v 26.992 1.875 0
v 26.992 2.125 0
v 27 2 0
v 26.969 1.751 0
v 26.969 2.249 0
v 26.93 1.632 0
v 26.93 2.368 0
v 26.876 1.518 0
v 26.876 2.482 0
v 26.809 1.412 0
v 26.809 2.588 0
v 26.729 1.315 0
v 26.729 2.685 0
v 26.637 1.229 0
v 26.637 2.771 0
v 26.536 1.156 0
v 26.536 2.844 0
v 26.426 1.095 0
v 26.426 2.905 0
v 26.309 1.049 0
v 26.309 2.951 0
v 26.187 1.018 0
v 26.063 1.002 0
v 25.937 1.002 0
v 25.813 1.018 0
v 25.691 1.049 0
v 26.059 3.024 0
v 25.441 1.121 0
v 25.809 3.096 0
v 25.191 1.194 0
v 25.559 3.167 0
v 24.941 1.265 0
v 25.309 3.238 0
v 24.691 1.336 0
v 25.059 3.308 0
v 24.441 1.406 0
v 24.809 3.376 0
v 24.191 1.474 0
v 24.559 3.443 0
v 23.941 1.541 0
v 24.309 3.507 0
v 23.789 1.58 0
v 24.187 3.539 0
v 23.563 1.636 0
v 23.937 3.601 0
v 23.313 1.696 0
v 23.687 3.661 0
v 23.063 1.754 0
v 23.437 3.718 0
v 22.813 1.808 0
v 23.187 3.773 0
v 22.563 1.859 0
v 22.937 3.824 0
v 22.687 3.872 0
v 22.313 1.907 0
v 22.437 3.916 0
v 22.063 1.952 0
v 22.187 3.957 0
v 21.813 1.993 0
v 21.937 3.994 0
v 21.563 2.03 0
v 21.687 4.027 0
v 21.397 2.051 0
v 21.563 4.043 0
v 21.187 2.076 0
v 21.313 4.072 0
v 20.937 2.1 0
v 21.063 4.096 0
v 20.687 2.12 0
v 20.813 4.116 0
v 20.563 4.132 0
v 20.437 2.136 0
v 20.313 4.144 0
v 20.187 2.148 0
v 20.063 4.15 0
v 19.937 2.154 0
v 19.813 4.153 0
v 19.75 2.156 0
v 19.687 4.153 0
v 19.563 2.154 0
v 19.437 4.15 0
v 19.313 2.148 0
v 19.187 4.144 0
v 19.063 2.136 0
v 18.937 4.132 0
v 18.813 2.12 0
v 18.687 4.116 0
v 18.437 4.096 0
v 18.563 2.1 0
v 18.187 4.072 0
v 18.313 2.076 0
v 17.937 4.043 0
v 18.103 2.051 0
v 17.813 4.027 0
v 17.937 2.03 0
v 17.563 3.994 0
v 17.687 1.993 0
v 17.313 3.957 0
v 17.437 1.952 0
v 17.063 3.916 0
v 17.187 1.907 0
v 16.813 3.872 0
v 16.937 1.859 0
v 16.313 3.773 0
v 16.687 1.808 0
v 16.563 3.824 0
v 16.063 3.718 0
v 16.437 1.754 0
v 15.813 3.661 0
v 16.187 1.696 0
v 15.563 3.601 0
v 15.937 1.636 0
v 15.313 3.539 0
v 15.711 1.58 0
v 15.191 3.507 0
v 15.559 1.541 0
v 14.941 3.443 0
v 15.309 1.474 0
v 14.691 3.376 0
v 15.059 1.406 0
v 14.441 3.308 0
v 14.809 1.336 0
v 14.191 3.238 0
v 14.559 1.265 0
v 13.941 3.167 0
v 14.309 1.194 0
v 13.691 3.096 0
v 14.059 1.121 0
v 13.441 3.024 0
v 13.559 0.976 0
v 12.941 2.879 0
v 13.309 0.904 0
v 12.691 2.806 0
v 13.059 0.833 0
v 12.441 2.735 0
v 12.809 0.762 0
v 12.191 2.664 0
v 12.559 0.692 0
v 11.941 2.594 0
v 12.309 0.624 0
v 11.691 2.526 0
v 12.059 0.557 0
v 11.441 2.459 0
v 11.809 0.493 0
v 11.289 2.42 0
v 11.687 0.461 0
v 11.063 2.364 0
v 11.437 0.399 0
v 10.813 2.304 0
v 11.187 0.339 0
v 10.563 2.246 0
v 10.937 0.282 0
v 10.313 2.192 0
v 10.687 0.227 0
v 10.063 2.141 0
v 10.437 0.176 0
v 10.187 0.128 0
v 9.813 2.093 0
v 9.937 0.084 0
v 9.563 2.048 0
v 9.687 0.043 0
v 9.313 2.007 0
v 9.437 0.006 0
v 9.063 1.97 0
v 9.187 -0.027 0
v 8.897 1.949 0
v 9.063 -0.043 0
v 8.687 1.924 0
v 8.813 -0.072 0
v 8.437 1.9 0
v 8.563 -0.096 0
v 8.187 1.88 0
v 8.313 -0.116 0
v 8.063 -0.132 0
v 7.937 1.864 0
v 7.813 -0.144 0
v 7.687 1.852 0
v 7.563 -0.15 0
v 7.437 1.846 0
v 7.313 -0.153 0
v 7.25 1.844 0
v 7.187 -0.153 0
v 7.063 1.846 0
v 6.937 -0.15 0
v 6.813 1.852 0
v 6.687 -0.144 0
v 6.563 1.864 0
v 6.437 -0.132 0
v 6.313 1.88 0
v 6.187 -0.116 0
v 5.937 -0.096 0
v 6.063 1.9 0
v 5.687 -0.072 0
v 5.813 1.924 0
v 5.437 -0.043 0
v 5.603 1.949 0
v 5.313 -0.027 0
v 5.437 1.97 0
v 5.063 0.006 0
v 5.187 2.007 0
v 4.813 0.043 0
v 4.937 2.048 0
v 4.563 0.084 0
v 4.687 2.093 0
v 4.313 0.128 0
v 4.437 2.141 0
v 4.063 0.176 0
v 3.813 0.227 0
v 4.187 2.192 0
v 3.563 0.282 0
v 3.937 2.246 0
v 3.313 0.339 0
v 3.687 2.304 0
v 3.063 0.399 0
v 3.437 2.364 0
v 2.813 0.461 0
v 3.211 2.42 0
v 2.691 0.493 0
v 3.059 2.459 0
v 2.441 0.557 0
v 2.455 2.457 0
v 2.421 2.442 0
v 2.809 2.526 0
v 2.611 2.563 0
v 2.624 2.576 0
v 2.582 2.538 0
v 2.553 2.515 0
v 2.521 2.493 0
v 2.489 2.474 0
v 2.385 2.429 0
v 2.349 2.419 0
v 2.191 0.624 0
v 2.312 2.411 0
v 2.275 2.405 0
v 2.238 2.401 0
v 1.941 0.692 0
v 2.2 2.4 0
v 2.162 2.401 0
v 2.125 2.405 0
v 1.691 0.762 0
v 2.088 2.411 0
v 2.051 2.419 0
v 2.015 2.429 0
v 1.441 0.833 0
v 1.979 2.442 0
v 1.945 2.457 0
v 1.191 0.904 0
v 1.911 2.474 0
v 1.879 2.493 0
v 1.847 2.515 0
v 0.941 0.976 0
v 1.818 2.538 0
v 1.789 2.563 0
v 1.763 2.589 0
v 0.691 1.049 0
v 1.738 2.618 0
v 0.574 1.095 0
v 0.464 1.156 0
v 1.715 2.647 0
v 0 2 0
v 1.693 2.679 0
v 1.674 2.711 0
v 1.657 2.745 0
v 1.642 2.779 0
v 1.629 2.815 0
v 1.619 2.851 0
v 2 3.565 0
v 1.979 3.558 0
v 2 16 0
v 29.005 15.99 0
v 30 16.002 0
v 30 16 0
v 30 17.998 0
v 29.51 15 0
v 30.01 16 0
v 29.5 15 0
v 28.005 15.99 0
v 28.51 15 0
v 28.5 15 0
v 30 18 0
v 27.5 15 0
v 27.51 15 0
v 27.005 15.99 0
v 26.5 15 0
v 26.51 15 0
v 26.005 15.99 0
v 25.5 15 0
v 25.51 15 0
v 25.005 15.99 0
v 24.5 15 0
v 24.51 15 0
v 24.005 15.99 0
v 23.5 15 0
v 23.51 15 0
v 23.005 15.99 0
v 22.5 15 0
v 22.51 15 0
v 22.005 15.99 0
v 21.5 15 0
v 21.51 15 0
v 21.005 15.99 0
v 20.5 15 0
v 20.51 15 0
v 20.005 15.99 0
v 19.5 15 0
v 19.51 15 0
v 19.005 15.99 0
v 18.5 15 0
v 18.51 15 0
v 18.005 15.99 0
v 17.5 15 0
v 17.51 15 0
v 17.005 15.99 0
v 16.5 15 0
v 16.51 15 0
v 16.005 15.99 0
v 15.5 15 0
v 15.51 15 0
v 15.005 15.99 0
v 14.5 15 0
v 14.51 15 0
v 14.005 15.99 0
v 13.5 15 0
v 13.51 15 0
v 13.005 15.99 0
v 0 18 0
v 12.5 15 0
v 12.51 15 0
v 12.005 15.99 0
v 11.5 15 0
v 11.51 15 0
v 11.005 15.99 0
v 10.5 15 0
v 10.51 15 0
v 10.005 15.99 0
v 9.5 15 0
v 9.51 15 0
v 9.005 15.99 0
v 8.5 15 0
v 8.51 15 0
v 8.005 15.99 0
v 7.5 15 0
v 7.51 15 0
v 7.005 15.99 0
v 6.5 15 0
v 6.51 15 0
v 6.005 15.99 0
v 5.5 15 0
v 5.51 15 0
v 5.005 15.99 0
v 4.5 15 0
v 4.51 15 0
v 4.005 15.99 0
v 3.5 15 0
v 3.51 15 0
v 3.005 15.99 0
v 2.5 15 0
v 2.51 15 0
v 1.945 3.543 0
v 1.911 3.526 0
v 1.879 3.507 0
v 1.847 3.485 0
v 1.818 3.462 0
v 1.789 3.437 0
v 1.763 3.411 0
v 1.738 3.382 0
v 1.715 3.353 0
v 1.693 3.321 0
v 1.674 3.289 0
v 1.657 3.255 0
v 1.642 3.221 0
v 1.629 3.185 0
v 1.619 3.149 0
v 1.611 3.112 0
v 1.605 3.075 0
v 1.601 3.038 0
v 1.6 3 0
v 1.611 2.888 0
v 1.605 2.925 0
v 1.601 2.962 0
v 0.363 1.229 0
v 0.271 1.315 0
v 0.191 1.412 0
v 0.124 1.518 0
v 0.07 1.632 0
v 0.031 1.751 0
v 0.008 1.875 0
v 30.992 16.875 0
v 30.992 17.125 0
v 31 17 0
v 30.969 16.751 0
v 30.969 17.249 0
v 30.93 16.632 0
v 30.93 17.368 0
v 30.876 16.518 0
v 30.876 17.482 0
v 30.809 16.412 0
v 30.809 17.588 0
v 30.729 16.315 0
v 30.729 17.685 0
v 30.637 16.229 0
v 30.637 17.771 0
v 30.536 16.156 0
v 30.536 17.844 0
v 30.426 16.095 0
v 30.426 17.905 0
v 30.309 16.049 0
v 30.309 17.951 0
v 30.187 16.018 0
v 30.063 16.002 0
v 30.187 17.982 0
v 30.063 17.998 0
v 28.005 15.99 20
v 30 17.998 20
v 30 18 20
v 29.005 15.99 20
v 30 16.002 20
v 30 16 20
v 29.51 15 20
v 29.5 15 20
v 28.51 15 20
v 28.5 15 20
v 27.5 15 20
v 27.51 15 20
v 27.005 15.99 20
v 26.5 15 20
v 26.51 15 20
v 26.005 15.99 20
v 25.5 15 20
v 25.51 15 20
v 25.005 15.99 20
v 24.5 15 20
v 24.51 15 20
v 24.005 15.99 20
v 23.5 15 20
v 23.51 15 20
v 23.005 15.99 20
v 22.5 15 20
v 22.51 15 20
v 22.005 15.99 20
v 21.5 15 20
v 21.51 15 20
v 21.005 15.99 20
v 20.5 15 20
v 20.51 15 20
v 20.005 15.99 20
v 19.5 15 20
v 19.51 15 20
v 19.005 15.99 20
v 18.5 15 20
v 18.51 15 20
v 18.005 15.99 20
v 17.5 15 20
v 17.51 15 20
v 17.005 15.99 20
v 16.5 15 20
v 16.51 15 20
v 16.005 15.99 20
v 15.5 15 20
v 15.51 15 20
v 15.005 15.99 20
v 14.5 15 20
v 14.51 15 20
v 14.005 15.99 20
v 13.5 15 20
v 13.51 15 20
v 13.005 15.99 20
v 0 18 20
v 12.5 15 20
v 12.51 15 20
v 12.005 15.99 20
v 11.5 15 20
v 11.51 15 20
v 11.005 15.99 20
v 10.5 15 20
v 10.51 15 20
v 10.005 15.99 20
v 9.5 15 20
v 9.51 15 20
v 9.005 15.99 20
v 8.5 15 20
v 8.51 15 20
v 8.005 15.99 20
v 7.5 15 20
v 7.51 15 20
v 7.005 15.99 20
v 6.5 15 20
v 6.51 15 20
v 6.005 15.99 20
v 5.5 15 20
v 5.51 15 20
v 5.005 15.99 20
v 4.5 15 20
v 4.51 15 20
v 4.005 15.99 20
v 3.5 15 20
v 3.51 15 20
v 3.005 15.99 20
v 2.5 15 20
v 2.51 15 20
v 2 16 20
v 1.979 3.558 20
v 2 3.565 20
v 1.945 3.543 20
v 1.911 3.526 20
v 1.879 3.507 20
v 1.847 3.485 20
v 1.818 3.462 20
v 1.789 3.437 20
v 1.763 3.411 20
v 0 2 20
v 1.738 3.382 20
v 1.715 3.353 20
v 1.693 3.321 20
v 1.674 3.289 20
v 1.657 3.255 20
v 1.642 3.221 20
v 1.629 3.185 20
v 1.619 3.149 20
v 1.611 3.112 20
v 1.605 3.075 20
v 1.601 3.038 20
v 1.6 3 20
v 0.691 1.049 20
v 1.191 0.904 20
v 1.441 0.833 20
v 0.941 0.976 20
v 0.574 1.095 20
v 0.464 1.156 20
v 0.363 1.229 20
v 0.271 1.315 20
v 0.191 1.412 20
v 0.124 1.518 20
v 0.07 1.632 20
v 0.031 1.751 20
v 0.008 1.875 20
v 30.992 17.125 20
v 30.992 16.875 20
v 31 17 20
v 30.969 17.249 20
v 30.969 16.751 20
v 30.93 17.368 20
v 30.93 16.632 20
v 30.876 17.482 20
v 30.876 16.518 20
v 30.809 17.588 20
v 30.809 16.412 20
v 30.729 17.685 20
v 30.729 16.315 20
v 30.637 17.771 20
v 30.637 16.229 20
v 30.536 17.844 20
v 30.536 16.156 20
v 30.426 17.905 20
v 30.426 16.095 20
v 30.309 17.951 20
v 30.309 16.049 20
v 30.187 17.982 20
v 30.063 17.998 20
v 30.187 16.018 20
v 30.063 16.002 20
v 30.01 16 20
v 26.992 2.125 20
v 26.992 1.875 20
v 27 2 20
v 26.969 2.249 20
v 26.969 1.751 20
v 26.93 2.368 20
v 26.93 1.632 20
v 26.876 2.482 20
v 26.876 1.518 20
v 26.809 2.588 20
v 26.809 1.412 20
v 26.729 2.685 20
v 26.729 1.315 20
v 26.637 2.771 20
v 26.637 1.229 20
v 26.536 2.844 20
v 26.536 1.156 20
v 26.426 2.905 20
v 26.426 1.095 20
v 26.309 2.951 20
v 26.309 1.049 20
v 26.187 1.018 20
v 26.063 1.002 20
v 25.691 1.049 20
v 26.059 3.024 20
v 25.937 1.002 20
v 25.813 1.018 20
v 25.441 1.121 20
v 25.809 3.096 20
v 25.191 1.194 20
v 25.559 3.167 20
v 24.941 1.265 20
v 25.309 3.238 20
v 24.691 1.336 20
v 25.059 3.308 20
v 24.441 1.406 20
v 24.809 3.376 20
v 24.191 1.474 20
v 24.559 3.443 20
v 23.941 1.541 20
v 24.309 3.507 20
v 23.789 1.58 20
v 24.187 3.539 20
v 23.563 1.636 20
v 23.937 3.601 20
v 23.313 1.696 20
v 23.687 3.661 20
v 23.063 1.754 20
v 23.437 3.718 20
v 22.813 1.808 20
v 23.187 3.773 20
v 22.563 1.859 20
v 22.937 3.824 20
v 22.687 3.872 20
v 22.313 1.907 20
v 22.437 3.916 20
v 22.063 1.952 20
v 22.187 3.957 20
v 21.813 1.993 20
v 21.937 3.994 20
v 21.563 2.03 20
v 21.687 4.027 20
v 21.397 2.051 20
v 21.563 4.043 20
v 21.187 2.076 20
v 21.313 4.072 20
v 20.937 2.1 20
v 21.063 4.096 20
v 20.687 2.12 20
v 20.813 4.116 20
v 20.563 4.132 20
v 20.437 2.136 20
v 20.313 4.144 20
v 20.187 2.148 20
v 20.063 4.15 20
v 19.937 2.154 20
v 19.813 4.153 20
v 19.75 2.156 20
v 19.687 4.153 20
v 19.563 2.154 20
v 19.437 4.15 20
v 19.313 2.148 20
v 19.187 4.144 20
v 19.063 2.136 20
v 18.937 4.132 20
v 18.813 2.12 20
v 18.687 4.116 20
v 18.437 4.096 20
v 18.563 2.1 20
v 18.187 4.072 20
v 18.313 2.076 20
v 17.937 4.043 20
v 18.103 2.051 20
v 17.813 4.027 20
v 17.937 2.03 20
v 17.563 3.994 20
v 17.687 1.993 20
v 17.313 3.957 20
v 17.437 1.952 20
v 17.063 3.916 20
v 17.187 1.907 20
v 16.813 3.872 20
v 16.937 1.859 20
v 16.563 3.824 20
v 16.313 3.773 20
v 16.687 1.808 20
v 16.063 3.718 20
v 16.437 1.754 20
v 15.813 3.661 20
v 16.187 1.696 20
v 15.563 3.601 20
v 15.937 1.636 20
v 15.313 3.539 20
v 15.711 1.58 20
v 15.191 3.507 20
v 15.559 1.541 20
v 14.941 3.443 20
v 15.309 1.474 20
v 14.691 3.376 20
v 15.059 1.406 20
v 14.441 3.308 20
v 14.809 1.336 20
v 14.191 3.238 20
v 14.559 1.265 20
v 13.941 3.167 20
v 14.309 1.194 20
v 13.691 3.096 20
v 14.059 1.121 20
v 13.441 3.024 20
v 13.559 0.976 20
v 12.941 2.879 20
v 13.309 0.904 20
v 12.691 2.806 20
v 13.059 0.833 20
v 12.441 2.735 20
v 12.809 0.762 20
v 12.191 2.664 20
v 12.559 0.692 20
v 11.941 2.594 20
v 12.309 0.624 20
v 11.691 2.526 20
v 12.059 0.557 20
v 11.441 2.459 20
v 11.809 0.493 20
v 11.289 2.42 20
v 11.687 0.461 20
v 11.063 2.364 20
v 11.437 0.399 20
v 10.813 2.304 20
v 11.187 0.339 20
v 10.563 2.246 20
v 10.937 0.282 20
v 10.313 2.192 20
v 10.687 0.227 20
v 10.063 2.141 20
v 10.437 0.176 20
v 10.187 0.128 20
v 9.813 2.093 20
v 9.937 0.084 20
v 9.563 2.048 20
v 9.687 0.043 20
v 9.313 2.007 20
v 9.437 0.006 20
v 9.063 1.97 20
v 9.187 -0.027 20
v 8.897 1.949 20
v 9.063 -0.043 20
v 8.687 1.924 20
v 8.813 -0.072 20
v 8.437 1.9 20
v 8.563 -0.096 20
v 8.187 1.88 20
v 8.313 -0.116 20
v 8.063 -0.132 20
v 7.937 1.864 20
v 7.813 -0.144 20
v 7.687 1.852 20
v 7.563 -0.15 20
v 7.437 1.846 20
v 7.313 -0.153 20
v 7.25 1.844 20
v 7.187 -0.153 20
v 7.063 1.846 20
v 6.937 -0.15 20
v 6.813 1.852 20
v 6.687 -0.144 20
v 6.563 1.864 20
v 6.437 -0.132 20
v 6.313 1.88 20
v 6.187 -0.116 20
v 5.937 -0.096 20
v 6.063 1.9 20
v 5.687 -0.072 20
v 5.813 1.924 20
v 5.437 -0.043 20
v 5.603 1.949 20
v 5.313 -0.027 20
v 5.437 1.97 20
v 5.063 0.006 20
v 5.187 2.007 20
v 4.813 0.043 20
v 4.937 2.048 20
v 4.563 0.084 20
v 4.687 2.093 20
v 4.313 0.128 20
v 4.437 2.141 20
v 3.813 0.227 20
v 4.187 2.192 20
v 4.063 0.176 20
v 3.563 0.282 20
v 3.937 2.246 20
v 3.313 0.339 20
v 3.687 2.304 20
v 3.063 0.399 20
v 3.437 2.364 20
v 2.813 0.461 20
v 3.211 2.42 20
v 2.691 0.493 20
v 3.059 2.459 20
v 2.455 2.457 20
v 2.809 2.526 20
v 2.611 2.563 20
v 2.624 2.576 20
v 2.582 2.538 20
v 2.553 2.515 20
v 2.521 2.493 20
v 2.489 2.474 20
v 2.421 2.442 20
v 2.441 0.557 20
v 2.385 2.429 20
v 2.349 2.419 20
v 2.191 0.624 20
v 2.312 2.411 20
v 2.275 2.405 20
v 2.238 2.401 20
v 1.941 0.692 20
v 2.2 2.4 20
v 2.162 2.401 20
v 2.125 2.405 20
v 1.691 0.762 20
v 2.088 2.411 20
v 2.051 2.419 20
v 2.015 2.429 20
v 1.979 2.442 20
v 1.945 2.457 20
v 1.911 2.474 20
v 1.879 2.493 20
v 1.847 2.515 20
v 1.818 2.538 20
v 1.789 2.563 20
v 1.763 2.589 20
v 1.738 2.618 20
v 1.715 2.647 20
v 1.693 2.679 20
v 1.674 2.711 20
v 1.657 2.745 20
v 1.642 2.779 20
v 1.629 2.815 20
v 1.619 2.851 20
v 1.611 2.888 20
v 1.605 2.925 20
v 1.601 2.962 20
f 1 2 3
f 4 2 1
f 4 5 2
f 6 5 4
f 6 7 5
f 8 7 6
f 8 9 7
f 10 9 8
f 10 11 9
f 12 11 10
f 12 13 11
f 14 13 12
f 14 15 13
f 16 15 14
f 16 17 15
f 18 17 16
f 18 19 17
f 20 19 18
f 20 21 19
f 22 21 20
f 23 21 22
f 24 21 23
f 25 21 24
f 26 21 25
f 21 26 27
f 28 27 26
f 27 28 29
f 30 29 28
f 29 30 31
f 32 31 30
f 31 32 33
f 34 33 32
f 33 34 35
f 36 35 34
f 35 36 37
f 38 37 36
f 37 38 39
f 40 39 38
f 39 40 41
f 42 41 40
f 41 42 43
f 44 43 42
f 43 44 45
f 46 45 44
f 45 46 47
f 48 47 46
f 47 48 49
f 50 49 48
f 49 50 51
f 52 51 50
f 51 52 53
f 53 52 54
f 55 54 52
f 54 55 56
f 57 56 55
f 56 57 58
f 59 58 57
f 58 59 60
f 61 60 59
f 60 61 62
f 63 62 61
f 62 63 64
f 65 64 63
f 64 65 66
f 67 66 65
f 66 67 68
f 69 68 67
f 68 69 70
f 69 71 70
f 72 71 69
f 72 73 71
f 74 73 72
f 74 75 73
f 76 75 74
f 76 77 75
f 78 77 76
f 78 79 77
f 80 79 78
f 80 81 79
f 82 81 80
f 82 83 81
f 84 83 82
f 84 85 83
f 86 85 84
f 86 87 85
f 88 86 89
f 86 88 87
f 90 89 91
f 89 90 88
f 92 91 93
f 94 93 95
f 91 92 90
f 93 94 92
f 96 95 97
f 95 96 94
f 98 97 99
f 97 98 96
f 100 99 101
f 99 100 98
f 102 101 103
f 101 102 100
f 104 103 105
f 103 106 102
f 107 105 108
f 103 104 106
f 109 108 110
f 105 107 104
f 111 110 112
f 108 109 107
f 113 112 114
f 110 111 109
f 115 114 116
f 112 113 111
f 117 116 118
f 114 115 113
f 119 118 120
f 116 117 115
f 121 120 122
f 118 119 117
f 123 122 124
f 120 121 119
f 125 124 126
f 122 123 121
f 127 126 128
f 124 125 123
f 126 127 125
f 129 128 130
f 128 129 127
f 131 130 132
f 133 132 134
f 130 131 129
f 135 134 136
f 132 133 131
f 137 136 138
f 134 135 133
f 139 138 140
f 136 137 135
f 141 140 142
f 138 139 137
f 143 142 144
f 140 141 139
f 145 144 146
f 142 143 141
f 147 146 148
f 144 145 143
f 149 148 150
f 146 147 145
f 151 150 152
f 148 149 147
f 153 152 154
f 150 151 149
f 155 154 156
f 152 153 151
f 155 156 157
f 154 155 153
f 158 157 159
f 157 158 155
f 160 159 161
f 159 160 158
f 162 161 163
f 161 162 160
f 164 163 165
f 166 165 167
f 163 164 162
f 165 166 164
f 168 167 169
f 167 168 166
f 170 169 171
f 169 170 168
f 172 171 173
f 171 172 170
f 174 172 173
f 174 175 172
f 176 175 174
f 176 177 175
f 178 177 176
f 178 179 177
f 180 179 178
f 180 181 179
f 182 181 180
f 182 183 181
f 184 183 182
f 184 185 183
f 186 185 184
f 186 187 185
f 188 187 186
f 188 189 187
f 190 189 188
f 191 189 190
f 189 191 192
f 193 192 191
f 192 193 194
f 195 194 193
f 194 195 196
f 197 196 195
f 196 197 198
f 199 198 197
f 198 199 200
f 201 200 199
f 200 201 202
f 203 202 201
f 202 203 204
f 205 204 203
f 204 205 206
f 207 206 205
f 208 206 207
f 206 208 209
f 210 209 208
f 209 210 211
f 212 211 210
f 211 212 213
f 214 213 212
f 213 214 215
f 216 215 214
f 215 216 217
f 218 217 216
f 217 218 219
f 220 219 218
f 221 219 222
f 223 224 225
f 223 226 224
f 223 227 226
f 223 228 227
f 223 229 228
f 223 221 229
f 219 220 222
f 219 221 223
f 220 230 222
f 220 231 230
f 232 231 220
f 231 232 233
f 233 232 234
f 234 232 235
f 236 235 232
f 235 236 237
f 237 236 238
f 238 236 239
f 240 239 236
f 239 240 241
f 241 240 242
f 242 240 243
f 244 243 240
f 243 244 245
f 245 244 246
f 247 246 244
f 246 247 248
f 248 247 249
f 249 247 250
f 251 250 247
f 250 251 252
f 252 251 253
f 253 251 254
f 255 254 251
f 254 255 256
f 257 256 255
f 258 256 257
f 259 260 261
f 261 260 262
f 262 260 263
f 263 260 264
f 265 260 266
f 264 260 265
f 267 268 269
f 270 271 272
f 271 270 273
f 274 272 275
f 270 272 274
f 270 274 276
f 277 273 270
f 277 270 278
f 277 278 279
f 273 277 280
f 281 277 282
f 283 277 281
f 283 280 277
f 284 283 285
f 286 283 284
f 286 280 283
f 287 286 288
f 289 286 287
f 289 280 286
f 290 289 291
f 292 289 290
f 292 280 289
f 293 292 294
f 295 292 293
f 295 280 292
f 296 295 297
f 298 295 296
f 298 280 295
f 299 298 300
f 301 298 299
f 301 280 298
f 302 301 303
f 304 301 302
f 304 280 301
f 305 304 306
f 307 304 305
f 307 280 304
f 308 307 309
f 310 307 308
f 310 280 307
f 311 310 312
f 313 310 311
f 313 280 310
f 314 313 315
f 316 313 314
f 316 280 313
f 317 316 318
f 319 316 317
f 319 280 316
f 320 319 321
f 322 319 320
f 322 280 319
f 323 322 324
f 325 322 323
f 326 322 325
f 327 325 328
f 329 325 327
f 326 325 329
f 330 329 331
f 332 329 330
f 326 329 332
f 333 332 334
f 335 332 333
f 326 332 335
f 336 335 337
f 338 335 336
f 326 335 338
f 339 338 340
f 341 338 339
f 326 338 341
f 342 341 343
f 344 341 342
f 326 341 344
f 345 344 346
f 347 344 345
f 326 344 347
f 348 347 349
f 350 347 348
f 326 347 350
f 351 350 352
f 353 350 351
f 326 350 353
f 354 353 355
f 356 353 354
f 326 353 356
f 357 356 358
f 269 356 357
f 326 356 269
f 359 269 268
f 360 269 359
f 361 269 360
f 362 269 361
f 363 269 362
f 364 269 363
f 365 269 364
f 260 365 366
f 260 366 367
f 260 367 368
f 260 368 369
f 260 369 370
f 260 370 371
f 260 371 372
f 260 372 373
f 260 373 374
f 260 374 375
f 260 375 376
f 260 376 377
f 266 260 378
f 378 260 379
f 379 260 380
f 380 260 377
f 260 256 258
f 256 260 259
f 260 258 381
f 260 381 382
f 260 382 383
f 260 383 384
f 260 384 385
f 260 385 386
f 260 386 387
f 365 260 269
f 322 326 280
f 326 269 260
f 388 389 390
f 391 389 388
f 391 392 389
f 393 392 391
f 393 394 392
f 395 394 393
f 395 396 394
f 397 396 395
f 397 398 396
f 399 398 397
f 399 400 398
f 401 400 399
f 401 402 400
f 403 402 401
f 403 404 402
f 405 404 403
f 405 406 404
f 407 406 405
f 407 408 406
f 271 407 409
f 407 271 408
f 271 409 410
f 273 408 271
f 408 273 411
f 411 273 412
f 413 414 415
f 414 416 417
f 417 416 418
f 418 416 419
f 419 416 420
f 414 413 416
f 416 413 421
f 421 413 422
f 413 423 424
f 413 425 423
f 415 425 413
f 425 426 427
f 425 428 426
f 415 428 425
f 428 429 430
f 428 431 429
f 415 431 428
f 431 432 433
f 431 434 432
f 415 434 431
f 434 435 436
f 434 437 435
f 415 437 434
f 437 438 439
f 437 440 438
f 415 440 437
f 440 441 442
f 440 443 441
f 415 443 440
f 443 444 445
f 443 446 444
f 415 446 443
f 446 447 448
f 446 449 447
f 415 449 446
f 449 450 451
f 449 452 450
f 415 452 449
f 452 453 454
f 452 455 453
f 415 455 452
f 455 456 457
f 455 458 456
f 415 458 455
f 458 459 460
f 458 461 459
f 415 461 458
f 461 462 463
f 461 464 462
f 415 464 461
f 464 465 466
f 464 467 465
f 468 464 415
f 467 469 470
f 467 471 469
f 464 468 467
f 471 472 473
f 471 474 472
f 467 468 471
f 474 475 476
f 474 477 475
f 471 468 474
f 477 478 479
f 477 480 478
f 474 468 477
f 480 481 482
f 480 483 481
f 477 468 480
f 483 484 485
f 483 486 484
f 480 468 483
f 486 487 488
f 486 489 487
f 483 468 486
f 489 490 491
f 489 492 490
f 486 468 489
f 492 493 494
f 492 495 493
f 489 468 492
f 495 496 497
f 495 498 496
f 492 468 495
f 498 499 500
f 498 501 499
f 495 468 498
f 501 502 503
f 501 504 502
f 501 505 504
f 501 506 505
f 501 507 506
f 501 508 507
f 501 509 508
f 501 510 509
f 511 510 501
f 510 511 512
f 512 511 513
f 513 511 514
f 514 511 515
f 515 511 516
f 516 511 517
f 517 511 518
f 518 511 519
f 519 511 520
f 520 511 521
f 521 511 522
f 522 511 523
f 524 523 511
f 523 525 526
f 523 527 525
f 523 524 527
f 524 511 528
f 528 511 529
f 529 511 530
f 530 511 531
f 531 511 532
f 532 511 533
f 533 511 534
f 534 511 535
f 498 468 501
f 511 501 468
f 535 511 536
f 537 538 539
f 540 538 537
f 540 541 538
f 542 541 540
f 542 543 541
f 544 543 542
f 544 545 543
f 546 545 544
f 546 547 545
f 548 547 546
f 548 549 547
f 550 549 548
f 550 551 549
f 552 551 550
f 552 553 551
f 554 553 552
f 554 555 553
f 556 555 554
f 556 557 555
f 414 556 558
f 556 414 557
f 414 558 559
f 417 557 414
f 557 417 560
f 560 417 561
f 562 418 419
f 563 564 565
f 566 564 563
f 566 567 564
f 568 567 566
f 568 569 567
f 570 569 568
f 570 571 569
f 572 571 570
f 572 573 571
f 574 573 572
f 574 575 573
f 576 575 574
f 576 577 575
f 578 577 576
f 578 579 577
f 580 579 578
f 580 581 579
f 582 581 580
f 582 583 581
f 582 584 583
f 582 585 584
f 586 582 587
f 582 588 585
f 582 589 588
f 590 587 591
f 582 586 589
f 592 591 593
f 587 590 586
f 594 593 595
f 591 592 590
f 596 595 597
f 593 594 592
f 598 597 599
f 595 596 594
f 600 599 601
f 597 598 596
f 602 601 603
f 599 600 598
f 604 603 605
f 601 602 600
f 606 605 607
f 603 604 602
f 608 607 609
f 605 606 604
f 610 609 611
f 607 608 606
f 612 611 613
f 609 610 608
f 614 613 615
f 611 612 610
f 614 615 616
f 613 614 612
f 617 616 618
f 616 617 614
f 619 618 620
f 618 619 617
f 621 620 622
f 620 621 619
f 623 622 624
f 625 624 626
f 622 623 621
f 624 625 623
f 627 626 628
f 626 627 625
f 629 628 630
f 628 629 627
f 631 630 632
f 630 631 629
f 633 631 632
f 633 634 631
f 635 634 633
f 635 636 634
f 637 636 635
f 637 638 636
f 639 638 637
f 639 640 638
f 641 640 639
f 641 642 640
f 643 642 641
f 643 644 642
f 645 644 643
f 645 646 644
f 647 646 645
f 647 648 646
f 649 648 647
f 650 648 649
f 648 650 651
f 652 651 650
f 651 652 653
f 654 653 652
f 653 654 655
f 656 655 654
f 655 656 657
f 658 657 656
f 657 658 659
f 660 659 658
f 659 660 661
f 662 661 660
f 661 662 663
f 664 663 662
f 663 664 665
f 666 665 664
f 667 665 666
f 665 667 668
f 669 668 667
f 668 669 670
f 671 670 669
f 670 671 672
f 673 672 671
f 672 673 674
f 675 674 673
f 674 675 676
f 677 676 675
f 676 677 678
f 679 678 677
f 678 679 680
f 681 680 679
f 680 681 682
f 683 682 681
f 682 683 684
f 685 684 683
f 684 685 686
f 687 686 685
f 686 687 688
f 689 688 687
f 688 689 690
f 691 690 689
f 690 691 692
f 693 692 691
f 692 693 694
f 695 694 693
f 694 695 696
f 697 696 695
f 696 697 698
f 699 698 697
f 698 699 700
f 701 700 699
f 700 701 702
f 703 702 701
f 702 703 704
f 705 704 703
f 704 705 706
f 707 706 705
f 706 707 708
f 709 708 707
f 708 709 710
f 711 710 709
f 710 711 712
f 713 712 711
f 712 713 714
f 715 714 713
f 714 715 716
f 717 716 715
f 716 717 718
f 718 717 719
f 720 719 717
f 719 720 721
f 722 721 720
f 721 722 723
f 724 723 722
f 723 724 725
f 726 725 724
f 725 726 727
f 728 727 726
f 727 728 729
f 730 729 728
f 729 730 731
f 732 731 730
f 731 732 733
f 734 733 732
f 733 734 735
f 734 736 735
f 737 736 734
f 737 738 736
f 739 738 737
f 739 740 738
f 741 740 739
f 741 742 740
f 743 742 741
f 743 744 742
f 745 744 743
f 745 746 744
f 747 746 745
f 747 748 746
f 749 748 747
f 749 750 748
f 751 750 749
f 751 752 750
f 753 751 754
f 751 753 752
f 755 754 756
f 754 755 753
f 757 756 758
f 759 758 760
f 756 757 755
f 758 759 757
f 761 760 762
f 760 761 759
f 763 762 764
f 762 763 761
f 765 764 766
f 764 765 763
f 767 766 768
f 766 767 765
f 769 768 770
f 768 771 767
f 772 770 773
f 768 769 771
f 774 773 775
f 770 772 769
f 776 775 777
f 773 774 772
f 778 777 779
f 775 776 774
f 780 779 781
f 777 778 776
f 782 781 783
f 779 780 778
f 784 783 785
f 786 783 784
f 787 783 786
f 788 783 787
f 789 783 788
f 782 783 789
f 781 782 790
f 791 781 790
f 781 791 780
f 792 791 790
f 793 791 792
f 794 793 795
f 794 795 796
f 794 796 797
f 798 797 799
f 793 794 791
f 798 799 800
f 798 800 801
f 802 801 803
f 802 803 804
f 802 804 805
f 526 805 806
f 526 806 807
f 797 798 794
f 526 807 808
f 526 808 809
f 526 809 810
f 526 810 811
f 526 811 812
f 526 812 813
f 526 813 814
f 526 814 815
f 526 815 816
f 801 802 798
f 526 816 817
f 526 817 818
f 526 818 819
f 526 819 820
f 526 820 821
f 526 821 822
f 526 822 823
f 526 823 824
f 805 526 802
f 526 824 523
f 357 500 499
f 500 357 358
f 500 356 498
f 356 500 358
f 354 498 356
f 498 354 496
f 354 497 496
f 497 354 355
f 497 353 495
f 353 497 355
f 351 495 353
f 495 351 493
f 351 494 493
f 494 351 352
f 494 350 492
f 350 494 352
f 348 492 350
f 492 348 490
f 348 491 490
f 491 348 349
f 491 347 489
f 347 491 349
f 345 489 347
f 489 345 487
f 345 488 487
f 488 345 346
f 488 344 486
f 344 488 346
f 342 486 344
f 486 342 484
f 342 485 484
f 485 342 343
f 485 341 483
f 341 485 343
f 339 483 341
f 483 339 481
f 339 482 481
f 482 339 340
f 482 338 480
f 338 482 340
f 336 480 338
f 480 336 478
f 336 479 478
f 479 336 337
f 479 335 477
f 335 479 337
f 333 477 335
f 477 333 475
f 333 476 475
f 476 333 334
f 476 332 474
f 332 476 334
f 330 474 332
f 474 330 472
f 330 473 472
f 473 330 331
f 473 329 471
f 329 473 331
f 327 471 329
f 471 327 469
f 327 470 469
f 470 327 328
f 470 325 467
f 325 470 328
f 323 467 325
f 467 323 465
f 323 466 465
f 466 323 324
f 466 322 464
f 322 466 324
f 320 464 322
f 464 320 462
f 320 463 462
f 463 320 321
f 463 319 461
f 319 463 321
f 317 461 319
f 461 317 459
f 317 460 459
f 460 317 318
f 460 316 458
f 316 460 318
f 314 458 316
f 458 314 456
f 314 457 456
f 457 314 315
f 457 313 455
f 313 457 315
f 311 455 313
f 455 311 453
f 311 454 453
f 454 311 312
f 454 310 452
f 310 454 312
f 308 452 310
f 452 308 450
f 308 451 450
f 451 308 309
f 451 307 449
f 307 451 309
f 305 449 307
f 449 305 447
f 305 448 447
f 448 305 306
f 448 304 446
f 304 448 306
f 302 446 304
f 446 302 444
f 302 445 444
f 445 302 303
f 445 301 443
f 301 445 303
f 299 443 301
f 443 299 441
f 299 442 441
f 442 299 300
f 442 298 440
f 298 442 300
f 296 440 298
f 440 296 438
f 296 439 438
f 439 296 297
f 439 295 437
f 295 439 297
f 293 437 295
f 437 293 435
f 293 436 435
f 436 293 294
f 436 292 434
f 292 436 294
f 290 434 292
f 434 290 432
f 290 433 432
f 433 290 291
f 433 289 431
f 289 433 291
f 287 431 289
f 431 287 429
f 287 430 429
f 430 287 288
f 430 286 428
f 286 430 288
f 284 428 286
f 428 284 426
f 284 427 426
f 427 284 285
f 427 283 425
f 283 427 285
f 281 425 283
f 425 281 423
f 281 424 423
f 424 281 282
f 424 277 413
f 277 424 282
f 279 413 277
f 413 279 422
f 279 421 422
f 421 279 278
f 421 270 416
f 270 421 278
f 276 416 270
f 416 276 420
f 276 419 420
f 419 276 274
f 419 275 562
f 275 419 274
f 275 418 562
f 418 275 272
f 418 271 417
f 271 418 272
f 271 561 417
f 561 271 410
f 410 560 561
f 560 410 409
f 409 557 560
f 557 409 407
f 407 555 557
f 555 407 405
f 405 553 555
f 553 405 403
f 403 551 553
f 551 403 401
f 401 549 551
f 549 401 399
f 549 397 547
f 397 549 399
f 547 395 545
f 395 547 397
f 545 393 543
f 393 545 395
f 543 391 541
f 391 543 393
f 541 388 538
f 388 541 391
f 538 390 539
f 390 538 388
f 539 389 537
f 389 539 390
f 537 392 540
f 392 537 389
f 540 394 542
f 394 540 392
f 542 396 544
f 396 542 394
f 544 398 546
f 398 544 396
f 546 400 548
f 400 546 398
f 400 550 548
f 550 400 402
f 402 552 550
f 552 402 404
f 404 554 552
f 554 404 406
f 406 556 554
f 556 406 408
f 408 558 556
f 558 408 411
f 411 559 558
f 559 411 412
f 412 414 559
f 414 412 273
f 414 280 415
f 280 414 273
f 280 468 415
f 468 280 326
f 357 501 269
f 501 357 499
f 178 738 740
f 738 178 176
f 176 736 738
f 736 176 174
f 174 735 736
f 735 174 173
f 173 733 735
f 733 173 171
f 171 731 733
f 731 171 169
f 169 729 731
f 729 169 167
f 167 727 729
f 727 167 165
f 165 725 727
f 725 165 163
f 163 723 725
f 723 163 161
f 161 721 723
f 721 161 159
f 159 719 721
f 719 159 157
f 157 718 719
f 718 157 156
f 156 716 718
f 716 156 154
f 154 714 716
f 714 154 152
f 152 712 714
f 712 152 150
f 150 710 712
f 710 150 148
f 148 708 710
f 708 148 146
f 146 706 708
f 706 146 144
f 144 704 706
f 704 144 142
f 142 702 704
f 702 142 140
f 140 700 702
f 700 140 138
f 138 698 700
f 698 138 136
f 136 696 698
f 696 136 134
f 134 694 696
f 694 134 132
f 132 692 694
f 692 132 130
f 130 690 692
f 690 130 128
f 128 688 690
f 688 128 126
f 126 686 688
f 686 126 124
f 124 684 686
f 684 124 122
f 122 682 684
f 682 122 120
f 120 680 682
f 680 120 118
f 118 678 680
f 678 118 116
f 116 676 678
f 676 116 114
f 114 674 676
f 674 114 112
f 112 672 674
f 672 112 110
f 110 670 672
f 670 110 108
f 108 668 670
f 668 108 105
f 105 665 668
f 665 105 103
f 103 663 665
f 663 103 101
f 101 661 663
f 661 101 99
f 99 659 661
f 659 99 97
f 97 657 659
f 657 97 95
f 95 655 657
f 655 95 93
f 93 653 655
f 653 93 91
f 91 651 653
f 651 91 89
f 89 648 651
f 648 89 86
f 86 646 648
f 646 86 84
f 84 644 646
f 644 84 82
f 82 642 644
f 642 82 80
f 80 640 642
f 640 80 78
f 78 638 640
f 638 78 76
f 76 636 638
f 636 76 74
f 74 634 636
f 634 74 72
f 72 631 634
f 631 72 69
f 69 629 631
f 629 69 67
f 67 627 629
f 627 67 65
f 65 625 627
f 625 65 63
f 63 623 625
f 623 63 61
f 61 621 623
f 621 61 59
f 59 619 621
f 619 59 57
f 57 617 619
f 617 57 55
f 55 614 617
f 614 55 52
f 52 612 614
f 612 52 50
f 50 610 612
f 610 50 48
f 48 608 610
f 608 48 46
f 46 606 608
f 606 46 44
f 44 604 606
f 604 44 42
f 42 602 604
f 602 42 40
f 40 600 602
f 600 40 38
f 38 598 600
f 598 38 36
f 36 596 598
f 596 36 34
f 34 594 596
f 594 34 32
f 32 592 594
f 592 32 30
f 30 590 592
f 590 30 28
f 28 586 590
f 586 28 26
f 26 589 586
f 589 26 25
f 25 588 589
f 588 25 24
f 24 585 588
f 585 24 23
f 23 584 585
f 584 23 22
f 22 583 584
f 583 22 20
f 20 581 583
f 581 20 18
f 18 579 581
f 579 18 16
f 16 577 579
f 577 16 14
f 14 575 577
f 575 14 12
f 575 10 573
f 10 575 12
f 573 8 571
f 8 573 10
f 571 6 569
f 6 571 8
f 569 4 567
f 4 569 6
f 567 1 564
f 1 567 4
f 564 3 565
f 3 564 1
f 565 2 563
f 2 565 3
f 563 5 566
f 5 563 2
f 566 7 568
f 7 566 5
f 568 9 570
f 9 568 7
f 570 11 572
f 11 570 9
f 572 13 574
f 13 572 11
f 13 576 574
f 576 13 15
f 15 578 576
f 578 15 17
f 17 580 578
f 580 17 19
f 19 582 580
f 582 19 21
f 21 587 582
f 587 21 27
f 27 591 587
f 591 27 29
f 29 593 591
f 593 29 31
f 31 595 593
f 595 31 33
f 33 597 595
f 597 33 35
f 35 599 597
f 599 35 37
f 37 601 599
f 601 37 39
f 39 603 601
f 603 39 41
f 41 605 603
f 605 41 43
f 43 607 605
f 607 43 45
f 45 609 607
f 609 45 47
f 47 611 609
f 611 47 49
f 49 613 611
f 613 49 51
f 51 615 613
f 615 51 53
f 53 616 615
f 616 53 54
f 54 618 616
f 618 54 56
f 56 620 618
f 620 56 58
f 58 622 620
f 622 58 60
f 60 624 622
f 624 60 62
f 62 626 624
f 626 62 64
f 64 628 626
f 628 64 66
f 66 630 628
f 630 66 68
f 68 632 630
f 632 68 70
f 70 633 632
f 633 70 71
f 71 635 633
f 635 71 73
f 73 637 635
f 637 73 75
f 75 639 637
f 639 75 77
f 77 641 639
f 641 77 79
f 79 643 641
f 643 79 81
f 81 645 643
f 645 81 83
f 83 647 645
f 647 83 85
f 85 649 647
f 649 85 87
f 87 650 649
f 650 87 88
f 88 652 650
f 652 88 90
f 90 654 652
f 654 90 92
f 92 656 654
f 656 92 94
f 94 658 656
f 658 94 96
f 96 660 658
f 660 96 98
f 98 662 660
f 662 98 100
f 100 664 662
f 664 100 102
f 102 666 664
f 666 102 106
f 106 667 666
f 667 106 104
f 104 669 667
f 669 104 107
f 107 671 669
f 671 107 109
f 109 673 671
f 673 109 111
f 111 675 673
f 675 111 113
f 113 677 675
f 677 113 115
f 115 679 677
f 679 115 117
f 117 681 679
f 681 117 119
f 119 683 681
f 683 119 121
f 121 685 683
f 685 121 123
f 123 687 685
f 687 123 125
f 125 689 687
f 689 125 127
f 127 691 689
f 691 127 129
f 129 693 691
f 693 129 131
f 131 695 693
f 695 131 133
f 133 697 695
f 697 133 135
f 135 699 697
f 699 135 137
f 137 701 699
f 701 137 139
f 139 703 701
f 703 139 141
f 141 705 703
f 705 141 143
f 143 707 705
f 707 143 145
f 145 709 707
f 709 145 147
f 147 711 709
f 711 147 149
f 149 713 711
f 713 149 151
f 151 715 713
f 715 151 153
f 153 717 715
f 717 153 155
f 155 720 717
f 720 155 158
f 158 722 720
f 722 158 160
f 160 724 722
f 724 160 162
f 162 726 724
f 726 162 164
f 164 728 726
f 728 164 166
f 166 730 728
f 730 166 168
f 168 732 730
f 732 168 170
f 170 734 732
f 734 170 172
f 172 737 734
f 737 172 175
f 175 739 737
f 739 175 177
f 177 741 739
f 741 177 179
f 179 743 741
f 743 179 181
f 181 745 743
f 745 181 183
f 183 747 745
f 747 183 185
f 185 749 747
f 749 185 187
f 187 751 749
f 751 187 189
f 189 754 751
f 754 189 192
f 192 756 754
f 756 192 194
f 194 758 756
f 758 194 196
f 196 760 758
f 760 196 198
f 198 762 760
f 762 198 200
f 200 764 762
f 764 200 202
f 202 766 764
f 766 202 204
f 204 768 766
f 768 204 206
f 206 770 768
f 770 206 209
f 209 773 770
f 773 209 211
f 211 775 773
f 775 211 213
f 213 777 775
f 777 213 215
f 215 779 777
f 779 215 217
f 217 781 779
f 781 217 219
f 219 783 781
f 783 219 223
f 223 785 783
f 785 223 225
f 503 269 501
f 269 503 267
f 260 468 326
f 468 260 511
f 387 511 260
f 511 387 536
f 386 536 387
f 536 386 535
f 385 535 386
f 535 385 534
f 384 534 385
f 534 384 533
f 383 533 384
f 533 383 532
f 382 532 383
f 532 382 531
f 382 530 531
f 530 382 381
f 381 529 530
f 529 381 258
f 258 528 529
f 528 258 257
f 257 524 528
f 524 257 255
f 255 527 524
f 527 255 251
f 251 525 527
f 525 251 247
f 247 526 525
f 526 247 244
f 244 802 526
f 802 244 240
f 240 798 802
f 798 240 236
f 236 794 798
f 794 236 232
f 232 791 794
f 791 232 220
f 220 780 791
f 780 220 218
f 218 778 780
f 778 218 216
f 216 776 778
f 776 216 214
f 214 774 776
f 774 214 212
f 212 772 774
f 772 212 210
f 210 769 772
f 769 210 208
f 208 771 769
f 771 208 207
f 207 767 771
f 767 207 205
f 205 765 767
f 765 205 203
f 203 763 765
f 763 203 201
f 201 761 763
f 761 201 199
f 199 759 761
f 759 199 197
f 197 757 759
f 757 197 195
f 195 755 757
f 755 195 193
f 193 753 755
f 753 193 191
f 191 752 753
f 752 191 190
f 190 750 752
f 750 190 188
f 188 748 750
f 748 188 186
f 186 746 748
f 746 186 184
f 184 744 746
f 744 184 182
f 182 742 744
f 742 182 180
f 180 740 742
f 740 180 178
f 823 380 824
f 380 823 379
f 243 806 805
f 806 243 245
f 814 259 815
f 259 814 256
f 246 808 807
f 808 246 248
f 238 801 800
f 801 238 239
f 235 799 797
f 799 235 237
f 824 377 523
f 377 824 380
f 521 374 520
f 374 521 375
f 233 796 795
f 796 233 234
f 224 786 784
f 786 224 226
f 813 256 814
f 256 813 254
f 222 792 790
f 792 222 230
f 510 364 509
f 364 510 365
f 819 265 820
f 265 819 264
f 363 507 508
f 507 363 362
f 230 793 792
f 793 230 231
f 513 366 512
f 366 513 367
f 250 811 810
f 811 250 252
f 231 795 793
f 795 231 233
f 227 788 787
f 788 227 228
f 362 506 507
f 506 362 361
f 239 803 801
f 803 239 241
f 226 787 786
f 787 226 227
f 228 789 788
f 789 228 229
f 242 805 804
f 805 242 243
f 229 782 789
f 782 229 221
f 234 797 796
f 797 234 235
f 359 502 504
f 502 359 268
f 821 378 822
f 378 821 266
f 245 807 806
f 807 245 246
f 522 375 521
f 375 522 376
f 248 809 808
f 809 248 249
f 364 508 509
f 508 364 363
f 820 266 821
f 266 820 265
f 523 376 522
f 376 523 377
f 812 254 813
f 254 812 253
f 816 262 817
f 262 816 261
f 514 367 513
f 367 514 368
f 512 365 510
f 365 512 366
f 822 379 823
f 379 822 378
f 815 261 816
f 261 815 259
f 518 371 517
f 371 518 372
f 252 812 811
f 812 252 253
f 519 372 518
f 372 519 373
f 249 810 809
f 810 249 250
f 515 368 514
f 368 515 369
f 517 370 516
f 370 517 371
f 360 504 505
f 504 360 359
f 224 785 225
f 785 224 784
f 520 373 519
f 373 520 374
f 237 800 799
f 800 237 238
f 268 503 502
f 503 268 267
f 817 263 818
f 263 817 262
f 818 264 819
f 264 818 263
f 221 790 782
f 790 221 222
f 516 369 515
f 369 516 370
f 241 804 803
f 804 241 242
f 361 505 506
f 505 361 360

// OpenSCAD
// https://makerworld.com/en/models/1127960-table-clip-generator-parametric-clamp?from=search#profileId-1127684

/* [Clamp Dimensions] */
// Top arm length (mm) 
top_arm_length   = 30; // [10:1:250]
// Lower arm length (mm) 
lower_arm_length = 25; // [10:1:250]
// Clamp height, i.e. distance between arms (mm) 
clamp_height = 13; // [5:1:250]
// Width of the clamp (mm)
clamp_width   = 20; // [5:1:100]
// Thickness of the clamp, i.e. more increases stability
clamp_thickness = 2; // [1:0.5:6]

/* [Clamp Features] */
// Increases the grip by adding a pattern to the top arm
with_texture       = true;
// Use S‐curve for the lower arm when enabled; otherwise, a straight lower arm is used.
with_s_curve = true;
// Helps to avoid stress fractures by adding a stress relief on the corner of the lower arm
add_stress_relief = true;

// Increase the back wall height by 1 mm if texture is enabled.
effective_clamp_height = clamp_height + (with_texture ? 1 : 0);

/* --- Function: S-Curve Center Line --- */
function s_curve_y(x) = - (clamp_thickness / sqrt(3)) * sin(360 * x / lower_arm_length) + (clamp_thickness / 2);

/* --- Module: S-Curve Lower Arm --- */
module lower_arm_s_curve() {
  translate([clamp_thickness/2, clamp_thickness/2]) {
    num_segments = 100; // Increase for a smoother curve.
    union() {
      for (i = [0 : num_segments-1]) {
        x0 = lower_arm_length * i / num_segments;
        x1 = lower_arm_length * (i+1) / num_segments;
        y0 = s_curve_y(x0);
        y1 = s_curve_y(x1);
        hull() {
          translate([x0, y0])
            circle(r = clamp_thickness/2, $fn = 50);
          translate([x1, y1])
            circle(r = clamp_thickness/2, $fn = 50);
        }
      }
    }
  }
}

/* --- Module: Rounded Lower Arm (if S-curve is disabled) --- */
module lower_arm_rounded() {
  translate([0, 0]) {
    union() {
      square([lower_arm_length, clamp_thickness]);
      intersection() {
         translate([lower_arm_length, clamp_thickness/2])
           circle(r = clamp_thickness/2, $fn = 50);
         translate([lower_arm_length, 0])
           square([clamp_thickness, clamp_thickness]);
      }
    }
  }
}

/* --- Module: Rounded Top Arm --- */
module top_arm_rounded() {
  union() {
    square([top_arm_length, clamp_thickness]);
    intersection() {
      translate([top_arm_length, clamp_thickness/2])
        circle(r = clamp_thickness/2, $fn = 50);
      translate([top_arm_length, 0])
        square([clamp_thickness, clamp_thickness]);
    }
  }
}

difference() {
  $fn = 100;
  linear_extrude(height = clamp_width) {
    union() {
      // Lower Arm 
      if (with_s_curve)
        lower_arm_s_curve();
      else
        lower_arm_rounded();
      
      // Back Wall
      translate([0, clamp_thickness])
        square([clamp_thickness, effective_clamp_height]);
      
      // Top Arm
      translate([0, clamp_thickness + effective_clamp_height])
        top_arm_rounded();
      
      // Optional Texture on the Top Arm's Inner Side
      if (with_texture) {
        texture_length = top_arm_length - clamp_thickness;
        for (i = [0 : texture_length - 1]) {
          translate([clamp_thickness + i, clamp_thickness + effective_clamp_height]) {
            hull() {
              polygon(points = [[0, 0], [1, 0], [0.5, -1]]);
              translate([0.01, 0])
                polygon(points = [[0, 0], [1, 0], [0.5, -1]]);
            }
          }
        }
      }
    }
  }
  
  // Subtractive Stress Relief
  if (add_stress_relief) {
    if (with_s_curve) {
    translate([clamp_thickness*1.1, clamp_thickness*1.5])
      linear_extrude(height = clamp_width + 1)
        circle(r = clamp_thickness * 0.3);
    } else {
    translate([clamp_thickness*1.1, clamp_thickness*1])
      linear_extrude(height = clamp_width + 1)
        circle(r = clamp_thickness * 0.3);
    }
  }
}
